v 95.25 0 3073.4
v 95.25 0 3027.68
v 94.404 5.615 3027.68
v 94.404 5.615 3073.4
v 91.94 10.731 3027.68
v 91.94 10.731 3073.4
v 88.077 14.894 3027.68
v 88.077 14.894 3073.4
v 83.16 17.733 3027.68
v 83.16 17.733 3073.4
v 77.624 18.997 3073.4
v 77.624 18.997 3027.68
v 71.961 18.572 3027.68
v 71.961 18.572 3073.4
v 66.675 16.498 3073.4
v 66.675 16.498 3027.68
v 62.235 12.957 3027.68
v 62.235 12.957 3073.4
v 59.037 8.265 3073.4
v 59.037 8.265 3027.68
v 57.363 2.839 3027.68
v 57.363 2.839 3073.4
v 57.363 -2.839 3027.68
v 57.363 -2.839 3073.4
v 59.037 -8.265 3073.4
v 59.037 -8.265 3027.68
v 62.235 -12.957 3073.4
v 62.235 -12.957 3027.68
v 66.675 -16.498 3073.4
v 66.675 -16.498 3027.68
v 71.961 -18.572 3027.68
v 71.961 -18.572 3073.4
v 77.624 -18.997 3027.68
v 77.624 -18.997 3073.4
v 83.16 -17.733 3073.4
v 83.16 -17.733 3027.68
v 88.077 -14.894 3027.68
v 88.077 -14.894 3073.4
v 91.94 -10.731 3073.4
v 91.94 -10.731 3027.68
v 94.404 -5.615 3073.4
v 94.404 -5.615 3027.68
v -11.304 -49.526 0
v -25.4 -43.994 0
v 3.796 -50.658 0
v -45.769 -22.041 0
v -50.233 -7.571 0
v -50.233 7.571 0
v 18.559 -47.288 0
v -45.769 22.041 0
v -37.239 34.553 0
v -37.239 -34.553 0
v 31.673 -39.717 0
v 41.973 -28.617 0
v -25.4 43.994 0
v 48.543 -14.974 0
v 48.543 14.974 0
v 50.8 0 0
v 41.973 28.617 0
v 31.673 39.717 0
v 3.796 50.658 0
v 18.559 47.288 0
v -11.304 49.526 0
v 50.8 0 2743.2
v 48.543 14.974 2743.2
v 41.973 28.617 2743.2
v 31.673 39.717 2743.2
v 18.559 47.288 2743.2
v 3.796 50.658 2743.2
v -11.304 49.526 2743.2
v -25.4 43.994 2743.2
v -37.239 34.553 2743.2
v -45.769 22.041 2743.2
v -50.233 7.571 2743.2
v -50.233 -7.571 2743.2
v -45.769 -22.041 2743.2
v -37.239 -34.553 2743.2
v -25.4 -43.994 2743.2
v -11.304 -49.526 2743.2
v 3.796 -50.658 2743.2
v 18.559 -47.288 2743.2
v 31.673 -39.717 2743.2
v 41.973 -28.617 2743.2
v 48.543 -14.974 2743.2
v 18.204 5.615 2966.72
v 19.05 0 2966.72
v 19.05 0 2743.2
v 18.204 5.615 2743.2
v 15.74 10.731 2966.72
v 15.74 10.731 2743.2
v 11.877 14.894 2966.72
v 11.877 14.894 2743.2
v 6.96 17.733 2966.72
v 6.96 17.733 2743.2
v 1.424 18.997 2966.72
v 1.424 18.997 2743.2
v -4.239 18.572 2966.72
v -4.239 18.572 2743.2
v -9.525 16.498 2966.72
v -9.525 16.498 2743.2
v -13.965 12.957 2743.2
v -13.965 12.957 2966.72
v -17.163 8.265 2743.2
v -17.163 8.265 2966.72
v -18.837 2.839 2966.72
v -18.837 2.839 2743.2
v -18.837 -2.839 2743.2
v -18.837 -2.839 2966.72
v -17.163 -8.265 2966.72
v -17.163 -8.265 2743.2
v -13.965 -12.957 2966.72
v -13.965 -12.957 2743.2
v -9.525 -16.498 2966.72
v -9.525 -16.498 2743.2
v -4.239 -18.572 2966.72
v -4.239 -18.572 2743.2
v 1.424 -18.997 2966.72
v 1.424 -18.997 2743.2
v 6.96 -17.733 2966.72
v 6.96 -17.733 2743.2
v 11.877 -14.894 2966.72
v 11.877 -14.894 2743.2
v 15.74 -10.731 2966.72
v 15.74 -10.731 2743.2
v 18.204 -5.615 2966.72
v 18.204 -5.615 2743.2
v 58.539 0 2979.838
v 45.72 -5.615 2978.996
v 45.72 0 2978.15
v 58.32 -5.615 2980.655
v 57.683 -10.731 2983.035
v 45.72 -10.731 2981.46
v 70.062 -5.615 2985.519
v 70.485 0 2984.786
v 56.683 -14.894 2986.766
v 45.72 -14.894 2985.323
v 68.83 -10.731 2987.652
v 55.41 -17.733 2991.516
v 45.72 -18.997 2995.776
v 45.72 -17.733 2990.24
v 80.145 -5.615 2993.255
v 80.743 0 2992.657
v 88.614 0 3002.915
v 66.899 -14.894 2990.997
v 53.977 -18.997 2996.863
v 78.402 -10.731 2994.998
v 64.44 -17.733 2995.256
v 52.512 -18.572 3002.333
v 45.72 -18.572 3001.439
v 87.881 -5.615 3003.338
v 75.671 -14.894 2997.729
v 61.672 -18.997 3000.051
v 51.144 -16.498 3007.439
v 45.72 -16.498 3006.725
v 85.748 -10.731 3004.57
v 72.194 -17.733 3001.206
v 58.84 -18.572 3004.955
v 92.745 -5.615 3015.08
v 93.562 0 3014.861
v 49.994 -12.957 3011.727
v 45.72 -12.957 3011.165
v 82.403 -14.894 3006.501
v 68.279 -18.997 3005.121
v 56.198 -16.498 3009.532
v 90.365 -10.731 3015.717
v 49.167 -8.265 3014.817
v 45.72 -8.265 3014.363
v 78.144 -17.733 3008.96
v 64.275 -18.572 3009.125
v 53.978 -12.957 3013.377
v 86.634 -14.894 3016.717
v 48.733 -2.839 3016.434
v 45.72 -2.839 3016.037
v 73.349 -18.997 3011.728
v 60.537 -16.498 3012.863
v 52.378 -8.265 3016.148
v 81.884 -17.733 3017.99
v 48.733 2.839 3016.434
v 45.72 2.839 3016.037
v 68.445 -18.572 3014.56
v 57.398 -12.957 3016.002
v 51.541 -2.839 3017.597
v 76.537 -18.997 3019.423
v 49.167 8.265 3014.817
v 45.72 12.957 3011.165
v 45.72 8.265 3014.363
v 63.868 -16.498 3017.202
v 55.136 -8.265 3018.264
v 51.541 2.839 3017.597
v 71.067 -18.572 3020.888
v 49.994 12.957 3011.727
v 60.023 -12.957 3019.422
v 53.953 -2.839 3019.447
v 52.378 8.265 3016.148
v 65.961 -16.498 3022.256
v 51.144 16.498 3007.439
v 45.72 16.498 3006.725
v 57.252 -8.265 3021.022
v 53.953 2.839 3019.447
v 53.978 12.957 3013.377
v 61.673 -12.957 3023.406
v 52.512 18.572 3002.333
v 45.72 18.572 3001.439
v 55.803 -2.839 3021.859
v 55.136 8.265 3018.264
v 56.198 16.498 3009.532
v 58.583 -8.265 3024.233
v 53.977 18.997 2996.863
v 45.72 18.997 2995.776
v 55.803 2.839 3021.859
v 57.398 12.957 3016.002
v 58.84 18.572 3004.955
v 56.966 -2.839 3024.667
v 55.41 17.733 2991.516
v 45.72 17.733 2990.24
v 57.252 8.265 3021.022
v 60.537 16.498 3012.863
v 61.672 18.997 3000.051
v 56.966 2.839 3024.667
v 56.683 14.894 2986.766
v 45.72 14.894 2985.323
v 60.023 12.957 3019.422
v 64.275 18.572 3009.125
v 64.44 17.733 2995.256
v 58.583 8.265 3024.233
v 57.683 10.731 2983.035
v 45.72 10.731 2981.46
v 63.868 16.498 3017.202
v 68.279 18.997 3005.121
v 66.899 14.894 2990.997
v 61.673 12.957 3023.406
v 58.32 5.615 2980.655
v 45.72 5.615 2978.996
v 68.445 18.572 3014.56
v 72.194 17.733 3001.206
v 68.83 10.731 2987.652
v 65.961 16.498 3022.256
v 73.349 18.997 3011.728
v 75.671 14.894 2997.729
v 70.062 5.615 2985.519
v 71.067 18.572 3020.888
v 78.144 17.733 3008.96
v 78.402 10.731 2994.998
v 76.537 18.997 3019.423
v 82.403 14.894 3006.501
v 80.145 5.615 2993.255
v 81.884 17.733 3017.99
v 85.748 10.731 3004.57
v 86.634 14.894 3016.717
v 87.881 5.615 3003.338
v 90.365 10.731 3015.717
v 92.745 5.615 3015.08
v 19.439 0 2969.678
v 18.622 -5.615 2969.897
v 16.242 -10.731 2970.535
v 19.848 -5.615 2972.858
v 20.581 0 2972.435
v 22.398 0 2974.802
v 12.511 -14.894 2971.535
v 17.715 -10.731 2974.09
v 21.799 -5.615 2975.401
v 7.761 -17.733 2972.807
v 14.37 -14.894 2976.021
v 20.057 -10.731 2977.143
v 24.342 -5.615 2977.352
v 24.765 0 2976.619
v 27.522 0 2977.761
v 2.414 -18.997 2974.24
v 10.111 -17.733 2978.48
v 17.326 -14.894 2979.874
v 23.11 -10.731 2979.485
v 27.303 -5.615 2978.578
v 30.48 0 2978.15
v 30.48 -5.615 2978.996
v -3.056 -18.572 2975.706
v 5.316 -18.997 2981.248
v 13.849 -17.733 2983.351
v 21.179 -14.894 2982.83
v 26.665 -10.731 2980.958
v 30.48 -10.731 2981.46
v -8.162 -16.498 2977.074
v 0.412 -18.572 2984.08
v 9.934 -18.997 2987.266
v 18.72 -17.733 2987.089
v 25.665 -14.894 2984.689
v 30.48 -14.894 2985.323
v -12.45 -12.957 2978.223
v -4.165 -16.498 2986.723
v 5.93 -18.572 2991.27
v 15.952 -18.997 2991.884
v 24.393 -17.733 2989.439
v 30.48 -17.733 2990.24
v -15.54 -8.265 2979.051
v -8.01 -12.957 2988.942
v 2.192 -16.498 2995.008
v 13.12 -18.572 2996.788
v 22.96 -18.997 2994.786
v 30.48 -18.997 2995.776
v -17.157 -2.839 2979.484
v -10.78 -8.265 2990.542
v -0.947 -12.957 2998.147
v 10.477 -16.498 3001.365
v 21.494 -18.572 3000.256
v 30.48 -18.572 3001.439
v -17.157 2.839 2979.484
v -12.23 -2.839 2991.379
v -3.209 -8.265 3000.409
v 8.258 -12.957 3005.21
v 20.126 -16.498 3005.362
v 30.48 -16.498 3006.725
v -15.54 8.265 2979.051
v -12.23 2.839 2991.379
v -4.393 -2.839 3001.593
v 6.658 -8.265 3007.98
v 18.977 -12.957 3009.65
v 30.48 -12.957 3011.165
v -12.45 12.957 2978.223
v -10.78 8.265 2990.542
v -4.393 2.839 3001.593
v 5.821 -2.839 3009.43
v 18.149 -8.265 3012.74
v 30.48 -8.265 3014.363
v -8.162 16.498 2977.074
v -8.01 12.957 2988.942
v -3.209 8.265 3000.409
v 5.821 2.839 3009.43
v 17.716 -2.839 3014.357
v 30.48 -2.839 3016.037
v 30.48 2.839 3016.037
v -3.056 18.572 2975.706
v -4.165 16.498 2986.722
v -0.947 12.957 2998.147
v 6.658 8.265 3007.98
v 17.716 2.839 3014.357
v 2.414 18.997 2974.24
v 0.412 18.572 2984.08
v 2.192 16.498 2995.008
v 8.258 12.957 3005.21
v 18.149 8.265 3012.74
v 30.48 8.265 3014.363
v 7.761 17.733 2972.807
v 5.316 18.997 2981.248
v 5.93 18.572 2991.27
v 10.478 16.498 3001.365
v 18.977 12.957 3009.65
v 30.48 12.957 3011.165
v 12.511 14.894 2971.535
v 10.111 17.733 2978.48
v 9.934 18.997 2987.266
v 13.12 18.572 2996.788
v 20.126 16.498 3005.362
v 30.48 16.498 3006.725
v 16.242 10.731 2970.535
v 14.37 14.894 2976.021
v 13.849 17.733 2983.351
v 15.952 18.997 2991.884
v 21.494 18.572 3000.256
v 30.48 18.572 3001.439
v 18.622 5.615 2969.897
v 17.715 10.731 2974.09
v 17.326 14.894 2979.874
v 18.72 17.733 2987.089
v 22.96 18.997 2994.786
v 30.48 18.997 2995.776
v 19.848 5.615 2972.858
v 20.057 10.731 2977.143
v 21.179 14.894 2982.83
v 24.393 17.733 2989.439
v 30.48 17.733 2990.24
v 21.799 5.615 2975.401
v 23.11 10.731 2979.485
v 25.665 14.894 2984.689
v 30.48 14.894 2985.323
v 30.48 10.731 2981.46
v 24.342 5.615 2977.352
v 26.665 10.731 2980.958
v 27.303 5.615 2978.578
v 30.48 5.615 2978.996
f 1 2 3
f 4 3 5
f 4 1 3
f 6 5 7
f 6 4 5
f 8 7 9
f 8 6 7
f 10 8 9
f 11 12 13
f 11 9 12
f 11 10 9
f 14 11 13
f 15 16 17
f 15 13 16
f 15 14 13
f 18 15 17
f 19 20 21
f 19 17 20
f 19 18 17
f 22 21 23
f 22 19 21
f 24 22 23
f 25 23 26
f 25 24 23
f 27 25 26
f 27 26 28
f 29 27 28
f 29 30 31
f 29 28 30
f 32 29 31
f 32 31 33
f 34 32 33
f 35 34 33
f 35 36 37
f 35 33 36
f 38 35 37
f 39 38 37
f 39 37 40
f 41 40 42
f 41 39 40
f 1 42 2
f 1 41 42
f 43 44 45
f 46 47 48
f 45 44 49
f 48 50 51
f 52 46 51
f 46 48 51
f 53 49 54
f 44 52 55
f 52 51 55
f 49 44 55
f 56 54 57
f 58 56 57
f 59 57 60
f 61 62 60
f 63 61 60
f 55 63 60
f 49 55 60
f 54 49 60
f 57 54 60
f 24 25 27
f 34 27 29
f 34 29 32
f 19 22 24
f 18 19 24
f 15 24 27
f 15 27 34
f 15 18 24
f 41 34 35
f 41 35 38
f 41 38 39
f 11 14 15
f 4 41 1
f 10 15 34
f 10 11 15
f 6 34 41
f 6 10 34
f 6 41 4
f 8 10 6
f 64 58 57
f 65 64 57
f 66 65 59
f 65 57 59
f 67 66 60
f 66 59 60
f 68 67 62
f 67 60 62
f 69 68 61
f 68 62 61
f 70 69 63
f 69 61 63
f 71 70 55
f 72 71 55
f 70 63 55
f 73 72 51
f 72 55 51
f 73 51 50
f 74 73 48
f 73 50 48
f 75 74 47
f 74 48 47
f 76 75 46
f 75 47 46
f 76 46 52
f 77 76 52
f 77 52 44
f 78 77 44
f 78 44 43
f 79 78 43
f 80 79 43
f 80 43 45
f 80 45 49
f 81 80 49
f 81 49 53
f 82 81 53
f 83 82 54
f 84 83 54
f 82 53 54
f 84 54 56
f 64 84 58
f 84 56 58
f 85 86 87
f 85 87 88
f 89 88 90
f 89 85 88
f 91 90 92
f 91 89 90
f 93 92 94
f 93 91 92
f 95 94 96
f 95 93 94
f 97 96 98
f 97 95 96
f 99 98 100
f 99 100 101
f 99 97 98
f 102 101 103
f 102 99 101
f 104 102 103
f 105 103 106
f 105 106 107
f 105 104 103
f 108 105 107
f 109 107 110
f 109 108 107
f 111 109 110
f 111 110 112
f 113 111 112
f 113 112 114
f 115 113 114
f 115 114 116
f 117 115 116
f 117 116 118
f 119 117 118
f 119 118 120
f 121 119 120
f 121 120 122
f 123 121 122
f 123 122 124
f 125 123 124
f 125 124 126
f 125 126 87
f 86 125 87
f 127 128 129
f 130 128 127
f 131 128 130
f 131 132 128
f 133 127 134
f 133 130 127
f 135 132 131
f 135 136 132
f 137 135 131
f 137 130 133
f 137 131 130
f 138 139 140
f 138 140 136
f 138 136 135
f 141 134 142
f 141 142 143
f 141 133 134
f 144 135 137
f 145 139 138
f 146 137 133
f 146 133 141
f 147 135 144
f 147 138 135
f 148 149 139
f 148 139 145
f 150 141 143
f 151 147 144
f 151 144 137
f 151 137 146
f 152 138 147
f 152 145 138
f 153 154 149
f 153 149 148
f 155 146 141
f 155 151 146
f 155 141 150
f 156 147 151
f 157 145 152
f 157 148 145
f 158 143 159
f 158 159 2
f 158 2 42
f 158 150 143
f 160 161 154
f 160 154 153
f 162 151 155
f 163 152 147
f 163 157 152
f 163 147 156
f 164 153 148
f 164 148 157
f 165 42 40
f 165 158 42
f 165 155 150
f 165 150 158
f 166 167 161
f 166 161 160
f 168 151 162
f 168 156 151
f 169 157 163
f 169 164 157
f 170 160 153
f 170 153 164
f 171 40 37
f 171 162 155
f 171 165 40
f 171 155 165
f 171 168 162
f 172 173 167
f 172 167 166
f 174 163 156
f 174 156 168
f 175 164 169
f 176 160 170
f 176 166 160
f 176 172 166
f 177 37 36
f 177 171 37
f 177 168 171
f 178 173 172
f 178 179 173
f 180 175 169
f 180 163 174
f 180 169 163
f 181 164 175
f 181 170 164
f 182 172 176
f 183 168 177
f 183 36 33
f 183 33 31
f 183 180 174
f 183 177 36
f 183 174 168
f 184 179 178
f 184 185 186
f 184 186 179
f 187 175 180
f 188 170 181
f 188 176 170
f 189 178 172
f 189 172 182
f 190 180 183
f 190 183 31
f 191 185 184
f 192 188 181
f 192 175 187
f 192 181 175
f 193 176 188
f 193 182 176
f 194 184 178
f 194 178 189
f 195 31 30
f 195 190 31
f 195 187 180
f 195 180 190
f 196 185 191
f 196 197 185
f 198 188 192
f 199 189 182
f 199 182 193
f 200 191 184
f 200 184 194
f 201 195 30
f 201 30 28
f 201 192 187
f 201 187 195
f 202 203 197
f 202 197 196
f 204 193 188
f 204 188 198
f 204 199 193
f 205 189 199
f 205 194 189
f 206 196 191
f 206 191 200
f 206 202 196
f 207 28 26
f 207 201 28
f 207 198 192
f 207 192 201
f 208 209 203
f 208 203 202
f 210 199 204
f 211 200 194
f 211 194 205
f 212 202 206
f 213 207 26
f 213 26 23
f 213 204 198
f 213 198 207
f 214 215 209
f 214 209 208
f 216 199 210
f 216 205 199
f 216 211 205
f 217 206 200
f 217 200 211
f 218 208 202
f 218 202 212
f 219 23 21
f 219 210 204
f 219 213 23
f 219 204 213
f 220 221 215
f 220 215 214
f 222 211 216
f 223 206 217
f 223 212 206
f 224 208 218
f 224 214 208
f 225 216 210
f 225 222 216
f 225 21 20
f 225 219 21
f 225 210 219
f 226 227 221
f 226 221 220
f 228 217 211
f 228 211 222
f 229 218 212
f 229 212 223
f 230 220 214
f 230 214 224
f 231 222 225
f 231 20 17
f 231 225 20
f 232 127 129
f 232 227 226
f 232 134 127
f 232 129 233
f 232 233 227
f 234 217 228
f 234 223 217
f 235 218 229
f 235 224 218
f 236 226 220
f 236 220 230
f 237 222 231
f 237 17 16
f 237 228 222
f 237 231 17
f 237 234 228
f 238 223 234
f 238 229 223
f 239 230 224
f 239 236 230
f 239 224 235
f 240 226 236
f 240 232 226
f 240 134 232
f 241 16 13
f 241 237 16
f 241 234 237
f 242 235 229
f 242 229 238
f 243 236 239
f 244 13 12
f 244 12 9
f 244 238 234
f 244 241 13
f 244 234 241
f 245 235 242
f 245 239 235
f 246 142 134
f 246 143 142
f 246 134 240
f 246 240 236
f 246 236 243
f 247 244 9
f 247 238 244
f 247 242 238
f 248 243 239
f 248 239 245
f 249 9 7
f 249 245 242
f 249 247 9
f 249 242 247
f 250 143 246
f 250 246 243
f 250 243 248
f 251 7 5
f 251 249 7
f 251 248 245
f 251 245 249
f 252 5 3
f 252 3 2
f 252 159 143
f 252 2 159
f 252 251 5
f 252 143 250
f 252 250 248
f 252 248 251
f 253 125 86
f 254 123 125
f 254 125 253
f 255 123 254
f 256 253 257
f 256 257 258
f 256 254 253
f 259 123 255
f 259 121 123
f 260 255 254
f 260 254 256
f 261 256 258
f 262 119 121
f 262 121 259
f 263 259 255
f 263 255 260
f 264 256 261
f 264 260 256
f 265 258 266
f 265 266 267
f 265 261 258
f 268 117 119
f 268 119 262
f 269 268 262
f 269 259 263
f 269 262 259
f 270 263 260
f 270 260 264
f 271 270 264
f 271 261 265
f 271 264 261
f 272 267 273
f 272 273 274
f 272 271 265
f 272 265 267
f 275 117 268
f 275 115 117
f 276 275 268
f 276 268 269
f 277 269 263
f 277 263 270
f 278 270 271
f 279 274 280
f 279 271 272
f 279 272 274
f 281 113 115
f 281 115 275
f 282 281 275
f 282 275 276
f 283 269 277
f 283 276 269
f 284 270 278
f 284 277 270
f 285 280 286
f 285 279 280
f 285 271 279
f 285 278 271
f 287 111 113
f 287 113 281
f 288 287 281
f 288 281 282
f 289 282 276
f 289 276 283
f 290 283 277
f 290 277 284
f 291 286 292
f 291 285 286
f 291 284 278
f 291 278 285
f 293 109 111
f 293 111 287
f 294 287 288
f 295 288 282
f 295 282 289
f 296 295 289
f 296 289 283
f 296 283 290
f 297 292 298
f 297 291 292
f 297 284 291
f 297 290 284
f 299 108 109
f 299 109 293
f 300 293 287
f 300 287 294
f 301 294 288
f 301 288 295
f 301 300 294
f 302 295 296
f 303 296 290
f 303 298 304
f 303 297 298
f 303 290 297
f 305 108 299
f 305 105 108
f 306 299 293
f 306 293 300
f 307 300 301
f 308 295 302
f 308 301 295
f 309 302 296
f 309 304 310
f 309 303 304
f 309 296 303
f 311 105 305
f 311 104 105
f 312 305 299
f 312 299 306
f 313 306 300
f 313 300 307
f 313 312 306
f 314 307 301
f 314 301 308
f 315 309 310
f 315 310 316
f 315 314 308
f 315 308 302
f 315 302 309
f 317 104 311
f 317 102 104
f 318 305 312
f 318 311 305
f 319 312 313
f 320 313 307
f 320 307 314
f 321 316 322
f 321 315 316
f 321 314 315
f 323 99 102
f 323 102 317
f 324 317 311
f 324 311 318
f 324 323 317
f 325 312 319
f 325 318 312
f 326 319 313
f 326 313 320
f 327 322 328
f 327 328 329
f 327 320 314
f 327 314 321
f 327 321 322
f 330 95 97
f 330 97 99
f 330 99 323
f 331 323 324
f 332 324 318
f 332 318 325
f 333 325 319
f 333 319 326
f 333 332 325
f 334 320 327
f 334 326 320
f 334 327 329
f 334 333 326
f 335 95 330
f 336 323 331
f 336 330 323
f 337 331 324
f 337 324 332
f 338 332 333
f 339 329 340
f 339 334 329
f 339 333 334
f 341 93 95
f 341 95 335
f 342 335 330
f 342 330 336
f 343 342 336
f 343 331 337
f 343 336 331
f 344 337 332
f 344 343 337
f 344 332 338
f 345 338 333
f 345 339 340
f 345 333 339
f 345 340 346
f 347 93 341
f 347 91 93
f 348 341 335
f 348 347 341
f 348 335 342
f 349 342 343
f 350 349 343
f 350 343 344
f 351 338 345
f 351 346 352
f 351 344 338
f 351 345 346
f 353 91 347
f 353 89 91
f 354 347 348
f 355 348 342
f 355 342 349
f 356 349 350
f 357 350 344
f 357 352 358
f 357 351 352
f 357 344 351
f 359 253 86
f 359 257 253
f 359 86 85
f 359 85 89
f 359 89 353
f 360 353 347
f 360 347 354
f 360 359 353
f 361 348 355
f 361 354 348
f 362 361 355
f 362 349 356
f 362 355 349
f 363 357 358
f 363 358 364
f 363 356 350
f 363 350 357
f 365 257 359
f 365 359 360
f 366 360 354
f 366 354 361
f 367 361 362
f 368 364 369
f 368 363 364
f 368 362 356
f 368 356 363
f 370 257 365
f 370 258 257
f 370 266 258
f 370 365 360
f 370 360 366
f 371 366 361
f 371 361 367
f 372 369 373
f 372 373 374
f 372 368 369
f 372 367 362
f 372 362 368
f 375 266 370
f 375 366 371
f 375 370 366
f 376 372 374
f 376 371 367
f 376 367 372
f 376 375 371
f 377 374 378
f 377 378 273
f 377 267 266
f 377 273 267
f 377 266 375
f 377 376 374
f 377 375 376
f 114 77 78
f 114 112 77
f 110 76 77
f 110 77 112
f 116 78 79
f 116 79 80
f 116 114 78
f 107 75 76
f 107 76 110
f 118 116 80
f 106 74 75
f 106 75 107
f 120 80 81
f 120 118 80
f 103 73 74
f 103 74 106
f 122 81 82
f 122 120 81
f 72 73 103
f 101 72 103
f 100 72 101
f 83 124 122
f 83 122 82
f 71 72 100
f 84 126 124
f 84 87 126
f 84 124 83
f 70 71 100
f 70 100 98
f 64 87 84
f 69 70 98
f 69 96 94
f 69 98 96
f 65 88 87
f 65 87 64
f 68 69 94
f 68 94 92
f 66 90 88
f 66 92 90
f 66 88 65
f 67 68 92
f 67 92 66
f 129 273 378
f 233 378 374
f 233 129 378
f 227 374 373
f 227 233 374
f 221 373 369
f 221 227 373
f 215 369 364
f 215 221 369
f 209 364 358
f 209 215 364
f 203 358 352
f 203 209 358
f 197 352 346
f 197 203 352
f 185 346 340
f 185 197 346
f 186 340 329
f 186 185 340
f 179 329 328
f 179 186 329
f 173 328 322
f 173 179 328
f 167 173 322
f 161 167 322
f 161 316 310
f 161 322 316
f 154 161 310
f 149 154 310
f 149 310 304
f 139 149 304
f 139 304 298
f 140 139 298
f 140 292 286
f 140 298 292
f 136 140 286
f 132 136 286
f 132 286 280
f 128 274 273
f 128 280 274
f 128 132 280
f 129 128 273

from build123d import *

# Parameters (mm, degrees)
SKETCH1_R           = 50.8
BOSS_EXTRUDE1_DEPTH = 2743.2
SKETCH6_R           = 19.05


with BuildPart() as part:
    # Sketch1 → Boss-Extrude1 (new body)
    with BuildSketch(Plane.XY):
        Circle(SKETCH1_R)
    extrude(amount=BOSS_EXTRUDE1_DEPTH)

    # Sweep1: sweep along a curve in space
    with BuildLine() as sweep1_path:
        Line((0, 0, 2743.2), (0, 0, 2966.72))
        ThreePointArc((30.48, 0, 2997.2), (8.927385309, 0, 2988.272614691), (0, 0, 2966.72))
        Line((30.48, 0, 2997.2), (45.72, 0, 2997.2))
        ThreePointArc((45.72, 0, 2997.2), (67.272614691, 0, 3006.127385309), (76.2, 0, 3027.68))
        Line((76.2, 0, 3027.68), (76.2, 0, 3073.4))
    # Sketch6 → Sweep1 (sweep)
    with BuildSketch(Plane.XY.offset(2743.2)):
        Circle(SKETCH6_R)
    sweep(path=sweep1_path.line)


solid = part.part
